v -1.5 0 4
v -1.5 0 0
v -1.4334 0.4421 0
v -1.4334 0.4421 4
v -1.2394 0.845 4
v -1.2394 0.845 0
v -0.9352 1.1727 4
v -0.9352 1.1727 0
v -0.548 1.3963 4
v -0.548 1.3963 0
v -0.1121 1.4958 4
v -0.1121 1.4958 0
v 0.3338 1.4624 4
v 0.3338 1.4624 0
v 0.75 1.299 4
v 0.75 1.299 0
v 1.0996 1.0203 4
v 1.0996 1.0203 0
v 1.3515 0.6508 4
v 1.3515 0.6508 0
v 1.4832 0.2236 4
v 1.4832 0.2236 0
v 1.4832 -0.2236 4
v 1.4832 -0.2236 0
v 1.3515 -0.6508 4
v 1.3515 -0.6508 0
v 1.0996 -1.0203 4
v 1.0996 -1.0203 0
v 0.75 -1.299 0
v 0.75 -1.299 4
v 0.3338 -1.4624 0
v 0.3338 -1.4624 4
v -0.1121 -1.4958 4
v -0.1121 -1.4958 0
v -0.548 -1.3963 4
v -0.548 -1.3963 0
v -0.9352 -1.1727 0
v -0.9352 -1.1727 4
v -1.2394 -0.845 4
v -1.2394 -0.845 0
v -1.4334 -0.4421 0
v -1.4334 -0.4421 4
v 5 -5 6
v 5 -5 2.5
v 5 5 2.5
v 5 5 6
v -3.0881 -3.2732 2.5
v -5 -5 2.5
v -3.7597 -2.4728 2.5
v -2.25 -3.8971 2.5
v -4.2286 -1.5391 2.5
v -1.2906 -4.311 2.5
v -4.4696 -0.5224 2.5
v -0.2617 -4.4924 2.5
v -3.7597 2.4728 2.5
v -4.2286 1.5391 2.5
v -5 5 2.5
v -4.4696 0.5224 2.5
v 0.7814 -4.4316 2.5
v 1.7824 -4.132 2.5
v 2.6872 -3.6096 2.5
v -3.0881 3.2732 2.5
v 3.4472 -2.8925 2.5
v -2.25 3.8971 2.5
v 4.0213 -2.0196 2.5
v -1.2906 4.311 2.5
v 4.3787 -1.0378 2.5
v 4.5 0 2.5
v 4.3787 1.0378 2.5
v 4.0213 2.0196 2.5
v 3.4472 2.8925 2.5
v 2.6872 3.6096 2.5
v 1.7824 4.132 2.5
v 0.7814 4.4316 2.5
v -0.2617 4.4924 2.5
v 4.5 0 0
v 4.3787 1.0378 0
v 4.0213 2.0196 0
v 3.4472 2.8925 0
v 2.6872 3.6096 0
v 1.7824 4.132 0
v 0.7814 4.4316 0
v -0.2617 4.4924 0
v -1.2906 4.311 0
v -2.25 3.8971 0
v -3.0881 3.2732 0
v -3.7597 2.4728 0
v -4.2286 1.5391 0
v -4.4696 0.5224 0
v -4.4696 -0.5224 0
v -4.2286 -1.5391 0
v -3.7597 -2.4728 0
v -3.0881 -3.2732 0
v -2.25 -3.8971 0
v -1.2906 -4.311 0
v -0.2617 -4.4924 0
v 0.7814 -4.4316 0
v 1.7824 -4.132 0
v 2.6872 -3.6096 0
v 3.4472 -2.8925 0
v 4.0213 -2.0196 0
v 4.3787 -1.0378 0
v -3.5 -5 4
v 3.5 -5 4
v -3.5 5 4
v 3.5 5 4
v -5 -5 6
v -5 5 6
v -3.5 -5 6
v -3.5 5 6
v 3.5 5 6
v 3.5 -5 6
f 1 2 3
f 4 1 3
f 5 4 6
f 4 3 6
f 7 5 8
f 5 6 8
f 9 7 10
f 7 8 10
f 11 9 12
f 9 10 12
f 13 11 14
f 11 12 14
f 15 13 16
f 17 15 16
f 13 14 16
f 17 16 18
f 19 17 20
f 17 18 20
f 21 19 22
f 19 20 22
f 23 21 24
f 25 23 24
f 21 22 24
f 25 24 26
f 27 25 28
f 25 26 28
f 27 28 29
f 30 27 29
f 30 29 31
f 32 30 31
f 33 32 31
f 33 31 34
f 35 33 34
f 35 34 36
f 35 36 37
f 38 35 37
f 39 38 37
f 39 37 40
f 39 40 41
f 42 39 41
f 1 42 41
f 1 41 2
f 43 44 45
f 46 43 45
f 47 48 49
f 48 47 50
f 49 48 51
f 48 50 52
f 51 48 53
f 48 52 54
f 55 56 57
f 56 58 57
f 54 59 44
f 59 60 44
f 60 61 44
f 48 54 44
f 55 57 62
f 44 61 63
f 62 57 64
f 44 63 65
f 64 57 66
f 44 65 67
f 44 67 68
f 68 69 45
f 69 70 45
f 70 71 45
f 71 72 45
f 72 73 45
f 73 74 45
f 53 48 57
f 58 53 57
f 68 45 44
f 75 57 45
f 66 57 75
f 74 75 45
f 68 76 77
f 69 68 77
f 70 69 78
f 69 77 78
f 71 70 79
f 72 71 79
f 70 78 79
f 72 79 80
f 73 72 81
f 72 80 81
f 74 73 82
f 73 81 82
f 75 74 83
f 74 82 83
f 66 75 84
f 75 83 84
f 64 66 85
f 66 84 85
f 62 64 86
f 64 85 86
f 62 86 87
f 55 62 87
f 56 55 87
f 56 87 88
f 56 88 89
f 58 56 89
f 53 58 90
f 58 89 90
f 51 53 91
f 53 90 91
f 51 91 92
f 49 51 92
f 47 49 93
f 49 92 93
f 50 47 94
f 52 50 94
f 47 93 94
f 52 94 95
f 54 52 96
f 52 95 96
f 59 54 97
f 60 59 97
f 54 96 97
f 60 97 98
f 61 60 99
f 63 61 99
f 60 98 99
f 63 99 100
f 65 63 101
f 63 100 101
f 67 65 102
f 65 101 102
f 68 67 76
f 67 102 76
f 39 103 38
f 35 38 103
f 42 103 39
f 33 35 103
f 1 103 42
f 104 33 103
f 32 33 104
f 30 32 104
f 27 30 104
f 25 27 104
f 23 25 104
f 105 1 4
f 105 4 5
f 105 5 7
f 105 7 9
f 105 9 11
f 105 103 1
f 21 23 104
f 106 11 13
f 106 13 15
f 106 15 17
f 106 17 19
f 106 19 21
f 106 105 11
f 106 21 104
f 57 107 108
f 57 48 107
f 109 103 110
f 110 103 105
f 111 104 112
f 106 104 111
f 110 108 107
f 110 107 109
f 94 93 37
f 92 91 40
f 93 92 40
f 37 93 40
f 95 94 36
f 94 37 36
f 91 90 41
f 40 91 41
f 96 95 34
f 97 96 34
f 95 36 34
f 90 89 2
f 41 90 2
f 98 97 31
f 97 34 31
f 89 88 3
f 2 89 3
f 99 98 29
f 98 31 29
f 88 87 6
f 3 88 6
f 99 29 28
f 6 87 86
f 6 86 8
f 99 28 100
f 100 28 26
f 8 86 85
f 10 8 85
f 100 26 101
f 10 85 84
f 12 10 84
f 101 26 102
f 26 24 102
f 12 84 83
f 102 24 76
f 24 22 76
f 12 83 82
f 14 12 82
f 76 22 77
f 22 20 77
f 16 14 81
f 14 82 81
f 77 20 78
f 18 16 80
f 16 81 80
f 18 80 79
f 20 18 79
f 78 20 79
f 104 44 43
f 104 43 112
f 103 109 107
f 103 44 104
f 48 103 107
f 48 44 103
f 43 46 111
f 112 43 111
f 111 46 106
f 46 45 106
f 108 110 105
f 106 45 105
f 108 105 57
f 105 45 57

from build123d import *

# Parameters (mm, degrees)
SKETCH_1_R            = 4.5
EXTRUDE_1_DEPTH       = 2.5
SKETCH_2_W            = 10
SKETCH_2_H            = 10
EXTRUDE_2_DEPTH       = 1.5
SKETCH_3_W            = 1.5
SKETCH_3_H            = 10
EXTRUDE_3_DEPTH       = 2
HOLE_WIZARD_3_0_3_1_D = 3


with BuildPart() as part:
    # 草圖1 → 填料-伸長1 (new body)
    with BuildSketch(Plane.XY):
        Circle(SKETCH_1_R)
    extrude(amount=EXTRUDE_1_DEPTH)

    # 草圖2 → 填料-伸長2 (add)
    with BuildSketch(Plane.XY.offset(2.5)):
        Rectangle(SKETCH_2_W, SKETCH_2_H)
    extrude(amount=EXTRUDE_2_DEPTH)

    # 草圖3 → 填料-伸長3 (add)
    with BuildSketch(Plane.XY.offset(4)):
        with Locations((-4.25, 0)):
            Rectangle(SKETCH_3_W, SKETCH_3_H)
    extrude_3 = extrude(amount=EXTRUDE_3_DEPTH)

    # 鏡射1: 填料-伸長3 across plane
    add(extrude_3.mirror(Plane(origin=(0, 0, 0), x_dir=(0, 0, 1), z_dir=(1, 0, 0))))

    # Ø3.0 (3) 直徑孔1 (through all)
    with Locations(Plane.XY.offset(4)):
        with Locations((0, 0)):
            Hole(HOLE_WIZARD_3_0_3_1_D / 2)


solid = part.part
